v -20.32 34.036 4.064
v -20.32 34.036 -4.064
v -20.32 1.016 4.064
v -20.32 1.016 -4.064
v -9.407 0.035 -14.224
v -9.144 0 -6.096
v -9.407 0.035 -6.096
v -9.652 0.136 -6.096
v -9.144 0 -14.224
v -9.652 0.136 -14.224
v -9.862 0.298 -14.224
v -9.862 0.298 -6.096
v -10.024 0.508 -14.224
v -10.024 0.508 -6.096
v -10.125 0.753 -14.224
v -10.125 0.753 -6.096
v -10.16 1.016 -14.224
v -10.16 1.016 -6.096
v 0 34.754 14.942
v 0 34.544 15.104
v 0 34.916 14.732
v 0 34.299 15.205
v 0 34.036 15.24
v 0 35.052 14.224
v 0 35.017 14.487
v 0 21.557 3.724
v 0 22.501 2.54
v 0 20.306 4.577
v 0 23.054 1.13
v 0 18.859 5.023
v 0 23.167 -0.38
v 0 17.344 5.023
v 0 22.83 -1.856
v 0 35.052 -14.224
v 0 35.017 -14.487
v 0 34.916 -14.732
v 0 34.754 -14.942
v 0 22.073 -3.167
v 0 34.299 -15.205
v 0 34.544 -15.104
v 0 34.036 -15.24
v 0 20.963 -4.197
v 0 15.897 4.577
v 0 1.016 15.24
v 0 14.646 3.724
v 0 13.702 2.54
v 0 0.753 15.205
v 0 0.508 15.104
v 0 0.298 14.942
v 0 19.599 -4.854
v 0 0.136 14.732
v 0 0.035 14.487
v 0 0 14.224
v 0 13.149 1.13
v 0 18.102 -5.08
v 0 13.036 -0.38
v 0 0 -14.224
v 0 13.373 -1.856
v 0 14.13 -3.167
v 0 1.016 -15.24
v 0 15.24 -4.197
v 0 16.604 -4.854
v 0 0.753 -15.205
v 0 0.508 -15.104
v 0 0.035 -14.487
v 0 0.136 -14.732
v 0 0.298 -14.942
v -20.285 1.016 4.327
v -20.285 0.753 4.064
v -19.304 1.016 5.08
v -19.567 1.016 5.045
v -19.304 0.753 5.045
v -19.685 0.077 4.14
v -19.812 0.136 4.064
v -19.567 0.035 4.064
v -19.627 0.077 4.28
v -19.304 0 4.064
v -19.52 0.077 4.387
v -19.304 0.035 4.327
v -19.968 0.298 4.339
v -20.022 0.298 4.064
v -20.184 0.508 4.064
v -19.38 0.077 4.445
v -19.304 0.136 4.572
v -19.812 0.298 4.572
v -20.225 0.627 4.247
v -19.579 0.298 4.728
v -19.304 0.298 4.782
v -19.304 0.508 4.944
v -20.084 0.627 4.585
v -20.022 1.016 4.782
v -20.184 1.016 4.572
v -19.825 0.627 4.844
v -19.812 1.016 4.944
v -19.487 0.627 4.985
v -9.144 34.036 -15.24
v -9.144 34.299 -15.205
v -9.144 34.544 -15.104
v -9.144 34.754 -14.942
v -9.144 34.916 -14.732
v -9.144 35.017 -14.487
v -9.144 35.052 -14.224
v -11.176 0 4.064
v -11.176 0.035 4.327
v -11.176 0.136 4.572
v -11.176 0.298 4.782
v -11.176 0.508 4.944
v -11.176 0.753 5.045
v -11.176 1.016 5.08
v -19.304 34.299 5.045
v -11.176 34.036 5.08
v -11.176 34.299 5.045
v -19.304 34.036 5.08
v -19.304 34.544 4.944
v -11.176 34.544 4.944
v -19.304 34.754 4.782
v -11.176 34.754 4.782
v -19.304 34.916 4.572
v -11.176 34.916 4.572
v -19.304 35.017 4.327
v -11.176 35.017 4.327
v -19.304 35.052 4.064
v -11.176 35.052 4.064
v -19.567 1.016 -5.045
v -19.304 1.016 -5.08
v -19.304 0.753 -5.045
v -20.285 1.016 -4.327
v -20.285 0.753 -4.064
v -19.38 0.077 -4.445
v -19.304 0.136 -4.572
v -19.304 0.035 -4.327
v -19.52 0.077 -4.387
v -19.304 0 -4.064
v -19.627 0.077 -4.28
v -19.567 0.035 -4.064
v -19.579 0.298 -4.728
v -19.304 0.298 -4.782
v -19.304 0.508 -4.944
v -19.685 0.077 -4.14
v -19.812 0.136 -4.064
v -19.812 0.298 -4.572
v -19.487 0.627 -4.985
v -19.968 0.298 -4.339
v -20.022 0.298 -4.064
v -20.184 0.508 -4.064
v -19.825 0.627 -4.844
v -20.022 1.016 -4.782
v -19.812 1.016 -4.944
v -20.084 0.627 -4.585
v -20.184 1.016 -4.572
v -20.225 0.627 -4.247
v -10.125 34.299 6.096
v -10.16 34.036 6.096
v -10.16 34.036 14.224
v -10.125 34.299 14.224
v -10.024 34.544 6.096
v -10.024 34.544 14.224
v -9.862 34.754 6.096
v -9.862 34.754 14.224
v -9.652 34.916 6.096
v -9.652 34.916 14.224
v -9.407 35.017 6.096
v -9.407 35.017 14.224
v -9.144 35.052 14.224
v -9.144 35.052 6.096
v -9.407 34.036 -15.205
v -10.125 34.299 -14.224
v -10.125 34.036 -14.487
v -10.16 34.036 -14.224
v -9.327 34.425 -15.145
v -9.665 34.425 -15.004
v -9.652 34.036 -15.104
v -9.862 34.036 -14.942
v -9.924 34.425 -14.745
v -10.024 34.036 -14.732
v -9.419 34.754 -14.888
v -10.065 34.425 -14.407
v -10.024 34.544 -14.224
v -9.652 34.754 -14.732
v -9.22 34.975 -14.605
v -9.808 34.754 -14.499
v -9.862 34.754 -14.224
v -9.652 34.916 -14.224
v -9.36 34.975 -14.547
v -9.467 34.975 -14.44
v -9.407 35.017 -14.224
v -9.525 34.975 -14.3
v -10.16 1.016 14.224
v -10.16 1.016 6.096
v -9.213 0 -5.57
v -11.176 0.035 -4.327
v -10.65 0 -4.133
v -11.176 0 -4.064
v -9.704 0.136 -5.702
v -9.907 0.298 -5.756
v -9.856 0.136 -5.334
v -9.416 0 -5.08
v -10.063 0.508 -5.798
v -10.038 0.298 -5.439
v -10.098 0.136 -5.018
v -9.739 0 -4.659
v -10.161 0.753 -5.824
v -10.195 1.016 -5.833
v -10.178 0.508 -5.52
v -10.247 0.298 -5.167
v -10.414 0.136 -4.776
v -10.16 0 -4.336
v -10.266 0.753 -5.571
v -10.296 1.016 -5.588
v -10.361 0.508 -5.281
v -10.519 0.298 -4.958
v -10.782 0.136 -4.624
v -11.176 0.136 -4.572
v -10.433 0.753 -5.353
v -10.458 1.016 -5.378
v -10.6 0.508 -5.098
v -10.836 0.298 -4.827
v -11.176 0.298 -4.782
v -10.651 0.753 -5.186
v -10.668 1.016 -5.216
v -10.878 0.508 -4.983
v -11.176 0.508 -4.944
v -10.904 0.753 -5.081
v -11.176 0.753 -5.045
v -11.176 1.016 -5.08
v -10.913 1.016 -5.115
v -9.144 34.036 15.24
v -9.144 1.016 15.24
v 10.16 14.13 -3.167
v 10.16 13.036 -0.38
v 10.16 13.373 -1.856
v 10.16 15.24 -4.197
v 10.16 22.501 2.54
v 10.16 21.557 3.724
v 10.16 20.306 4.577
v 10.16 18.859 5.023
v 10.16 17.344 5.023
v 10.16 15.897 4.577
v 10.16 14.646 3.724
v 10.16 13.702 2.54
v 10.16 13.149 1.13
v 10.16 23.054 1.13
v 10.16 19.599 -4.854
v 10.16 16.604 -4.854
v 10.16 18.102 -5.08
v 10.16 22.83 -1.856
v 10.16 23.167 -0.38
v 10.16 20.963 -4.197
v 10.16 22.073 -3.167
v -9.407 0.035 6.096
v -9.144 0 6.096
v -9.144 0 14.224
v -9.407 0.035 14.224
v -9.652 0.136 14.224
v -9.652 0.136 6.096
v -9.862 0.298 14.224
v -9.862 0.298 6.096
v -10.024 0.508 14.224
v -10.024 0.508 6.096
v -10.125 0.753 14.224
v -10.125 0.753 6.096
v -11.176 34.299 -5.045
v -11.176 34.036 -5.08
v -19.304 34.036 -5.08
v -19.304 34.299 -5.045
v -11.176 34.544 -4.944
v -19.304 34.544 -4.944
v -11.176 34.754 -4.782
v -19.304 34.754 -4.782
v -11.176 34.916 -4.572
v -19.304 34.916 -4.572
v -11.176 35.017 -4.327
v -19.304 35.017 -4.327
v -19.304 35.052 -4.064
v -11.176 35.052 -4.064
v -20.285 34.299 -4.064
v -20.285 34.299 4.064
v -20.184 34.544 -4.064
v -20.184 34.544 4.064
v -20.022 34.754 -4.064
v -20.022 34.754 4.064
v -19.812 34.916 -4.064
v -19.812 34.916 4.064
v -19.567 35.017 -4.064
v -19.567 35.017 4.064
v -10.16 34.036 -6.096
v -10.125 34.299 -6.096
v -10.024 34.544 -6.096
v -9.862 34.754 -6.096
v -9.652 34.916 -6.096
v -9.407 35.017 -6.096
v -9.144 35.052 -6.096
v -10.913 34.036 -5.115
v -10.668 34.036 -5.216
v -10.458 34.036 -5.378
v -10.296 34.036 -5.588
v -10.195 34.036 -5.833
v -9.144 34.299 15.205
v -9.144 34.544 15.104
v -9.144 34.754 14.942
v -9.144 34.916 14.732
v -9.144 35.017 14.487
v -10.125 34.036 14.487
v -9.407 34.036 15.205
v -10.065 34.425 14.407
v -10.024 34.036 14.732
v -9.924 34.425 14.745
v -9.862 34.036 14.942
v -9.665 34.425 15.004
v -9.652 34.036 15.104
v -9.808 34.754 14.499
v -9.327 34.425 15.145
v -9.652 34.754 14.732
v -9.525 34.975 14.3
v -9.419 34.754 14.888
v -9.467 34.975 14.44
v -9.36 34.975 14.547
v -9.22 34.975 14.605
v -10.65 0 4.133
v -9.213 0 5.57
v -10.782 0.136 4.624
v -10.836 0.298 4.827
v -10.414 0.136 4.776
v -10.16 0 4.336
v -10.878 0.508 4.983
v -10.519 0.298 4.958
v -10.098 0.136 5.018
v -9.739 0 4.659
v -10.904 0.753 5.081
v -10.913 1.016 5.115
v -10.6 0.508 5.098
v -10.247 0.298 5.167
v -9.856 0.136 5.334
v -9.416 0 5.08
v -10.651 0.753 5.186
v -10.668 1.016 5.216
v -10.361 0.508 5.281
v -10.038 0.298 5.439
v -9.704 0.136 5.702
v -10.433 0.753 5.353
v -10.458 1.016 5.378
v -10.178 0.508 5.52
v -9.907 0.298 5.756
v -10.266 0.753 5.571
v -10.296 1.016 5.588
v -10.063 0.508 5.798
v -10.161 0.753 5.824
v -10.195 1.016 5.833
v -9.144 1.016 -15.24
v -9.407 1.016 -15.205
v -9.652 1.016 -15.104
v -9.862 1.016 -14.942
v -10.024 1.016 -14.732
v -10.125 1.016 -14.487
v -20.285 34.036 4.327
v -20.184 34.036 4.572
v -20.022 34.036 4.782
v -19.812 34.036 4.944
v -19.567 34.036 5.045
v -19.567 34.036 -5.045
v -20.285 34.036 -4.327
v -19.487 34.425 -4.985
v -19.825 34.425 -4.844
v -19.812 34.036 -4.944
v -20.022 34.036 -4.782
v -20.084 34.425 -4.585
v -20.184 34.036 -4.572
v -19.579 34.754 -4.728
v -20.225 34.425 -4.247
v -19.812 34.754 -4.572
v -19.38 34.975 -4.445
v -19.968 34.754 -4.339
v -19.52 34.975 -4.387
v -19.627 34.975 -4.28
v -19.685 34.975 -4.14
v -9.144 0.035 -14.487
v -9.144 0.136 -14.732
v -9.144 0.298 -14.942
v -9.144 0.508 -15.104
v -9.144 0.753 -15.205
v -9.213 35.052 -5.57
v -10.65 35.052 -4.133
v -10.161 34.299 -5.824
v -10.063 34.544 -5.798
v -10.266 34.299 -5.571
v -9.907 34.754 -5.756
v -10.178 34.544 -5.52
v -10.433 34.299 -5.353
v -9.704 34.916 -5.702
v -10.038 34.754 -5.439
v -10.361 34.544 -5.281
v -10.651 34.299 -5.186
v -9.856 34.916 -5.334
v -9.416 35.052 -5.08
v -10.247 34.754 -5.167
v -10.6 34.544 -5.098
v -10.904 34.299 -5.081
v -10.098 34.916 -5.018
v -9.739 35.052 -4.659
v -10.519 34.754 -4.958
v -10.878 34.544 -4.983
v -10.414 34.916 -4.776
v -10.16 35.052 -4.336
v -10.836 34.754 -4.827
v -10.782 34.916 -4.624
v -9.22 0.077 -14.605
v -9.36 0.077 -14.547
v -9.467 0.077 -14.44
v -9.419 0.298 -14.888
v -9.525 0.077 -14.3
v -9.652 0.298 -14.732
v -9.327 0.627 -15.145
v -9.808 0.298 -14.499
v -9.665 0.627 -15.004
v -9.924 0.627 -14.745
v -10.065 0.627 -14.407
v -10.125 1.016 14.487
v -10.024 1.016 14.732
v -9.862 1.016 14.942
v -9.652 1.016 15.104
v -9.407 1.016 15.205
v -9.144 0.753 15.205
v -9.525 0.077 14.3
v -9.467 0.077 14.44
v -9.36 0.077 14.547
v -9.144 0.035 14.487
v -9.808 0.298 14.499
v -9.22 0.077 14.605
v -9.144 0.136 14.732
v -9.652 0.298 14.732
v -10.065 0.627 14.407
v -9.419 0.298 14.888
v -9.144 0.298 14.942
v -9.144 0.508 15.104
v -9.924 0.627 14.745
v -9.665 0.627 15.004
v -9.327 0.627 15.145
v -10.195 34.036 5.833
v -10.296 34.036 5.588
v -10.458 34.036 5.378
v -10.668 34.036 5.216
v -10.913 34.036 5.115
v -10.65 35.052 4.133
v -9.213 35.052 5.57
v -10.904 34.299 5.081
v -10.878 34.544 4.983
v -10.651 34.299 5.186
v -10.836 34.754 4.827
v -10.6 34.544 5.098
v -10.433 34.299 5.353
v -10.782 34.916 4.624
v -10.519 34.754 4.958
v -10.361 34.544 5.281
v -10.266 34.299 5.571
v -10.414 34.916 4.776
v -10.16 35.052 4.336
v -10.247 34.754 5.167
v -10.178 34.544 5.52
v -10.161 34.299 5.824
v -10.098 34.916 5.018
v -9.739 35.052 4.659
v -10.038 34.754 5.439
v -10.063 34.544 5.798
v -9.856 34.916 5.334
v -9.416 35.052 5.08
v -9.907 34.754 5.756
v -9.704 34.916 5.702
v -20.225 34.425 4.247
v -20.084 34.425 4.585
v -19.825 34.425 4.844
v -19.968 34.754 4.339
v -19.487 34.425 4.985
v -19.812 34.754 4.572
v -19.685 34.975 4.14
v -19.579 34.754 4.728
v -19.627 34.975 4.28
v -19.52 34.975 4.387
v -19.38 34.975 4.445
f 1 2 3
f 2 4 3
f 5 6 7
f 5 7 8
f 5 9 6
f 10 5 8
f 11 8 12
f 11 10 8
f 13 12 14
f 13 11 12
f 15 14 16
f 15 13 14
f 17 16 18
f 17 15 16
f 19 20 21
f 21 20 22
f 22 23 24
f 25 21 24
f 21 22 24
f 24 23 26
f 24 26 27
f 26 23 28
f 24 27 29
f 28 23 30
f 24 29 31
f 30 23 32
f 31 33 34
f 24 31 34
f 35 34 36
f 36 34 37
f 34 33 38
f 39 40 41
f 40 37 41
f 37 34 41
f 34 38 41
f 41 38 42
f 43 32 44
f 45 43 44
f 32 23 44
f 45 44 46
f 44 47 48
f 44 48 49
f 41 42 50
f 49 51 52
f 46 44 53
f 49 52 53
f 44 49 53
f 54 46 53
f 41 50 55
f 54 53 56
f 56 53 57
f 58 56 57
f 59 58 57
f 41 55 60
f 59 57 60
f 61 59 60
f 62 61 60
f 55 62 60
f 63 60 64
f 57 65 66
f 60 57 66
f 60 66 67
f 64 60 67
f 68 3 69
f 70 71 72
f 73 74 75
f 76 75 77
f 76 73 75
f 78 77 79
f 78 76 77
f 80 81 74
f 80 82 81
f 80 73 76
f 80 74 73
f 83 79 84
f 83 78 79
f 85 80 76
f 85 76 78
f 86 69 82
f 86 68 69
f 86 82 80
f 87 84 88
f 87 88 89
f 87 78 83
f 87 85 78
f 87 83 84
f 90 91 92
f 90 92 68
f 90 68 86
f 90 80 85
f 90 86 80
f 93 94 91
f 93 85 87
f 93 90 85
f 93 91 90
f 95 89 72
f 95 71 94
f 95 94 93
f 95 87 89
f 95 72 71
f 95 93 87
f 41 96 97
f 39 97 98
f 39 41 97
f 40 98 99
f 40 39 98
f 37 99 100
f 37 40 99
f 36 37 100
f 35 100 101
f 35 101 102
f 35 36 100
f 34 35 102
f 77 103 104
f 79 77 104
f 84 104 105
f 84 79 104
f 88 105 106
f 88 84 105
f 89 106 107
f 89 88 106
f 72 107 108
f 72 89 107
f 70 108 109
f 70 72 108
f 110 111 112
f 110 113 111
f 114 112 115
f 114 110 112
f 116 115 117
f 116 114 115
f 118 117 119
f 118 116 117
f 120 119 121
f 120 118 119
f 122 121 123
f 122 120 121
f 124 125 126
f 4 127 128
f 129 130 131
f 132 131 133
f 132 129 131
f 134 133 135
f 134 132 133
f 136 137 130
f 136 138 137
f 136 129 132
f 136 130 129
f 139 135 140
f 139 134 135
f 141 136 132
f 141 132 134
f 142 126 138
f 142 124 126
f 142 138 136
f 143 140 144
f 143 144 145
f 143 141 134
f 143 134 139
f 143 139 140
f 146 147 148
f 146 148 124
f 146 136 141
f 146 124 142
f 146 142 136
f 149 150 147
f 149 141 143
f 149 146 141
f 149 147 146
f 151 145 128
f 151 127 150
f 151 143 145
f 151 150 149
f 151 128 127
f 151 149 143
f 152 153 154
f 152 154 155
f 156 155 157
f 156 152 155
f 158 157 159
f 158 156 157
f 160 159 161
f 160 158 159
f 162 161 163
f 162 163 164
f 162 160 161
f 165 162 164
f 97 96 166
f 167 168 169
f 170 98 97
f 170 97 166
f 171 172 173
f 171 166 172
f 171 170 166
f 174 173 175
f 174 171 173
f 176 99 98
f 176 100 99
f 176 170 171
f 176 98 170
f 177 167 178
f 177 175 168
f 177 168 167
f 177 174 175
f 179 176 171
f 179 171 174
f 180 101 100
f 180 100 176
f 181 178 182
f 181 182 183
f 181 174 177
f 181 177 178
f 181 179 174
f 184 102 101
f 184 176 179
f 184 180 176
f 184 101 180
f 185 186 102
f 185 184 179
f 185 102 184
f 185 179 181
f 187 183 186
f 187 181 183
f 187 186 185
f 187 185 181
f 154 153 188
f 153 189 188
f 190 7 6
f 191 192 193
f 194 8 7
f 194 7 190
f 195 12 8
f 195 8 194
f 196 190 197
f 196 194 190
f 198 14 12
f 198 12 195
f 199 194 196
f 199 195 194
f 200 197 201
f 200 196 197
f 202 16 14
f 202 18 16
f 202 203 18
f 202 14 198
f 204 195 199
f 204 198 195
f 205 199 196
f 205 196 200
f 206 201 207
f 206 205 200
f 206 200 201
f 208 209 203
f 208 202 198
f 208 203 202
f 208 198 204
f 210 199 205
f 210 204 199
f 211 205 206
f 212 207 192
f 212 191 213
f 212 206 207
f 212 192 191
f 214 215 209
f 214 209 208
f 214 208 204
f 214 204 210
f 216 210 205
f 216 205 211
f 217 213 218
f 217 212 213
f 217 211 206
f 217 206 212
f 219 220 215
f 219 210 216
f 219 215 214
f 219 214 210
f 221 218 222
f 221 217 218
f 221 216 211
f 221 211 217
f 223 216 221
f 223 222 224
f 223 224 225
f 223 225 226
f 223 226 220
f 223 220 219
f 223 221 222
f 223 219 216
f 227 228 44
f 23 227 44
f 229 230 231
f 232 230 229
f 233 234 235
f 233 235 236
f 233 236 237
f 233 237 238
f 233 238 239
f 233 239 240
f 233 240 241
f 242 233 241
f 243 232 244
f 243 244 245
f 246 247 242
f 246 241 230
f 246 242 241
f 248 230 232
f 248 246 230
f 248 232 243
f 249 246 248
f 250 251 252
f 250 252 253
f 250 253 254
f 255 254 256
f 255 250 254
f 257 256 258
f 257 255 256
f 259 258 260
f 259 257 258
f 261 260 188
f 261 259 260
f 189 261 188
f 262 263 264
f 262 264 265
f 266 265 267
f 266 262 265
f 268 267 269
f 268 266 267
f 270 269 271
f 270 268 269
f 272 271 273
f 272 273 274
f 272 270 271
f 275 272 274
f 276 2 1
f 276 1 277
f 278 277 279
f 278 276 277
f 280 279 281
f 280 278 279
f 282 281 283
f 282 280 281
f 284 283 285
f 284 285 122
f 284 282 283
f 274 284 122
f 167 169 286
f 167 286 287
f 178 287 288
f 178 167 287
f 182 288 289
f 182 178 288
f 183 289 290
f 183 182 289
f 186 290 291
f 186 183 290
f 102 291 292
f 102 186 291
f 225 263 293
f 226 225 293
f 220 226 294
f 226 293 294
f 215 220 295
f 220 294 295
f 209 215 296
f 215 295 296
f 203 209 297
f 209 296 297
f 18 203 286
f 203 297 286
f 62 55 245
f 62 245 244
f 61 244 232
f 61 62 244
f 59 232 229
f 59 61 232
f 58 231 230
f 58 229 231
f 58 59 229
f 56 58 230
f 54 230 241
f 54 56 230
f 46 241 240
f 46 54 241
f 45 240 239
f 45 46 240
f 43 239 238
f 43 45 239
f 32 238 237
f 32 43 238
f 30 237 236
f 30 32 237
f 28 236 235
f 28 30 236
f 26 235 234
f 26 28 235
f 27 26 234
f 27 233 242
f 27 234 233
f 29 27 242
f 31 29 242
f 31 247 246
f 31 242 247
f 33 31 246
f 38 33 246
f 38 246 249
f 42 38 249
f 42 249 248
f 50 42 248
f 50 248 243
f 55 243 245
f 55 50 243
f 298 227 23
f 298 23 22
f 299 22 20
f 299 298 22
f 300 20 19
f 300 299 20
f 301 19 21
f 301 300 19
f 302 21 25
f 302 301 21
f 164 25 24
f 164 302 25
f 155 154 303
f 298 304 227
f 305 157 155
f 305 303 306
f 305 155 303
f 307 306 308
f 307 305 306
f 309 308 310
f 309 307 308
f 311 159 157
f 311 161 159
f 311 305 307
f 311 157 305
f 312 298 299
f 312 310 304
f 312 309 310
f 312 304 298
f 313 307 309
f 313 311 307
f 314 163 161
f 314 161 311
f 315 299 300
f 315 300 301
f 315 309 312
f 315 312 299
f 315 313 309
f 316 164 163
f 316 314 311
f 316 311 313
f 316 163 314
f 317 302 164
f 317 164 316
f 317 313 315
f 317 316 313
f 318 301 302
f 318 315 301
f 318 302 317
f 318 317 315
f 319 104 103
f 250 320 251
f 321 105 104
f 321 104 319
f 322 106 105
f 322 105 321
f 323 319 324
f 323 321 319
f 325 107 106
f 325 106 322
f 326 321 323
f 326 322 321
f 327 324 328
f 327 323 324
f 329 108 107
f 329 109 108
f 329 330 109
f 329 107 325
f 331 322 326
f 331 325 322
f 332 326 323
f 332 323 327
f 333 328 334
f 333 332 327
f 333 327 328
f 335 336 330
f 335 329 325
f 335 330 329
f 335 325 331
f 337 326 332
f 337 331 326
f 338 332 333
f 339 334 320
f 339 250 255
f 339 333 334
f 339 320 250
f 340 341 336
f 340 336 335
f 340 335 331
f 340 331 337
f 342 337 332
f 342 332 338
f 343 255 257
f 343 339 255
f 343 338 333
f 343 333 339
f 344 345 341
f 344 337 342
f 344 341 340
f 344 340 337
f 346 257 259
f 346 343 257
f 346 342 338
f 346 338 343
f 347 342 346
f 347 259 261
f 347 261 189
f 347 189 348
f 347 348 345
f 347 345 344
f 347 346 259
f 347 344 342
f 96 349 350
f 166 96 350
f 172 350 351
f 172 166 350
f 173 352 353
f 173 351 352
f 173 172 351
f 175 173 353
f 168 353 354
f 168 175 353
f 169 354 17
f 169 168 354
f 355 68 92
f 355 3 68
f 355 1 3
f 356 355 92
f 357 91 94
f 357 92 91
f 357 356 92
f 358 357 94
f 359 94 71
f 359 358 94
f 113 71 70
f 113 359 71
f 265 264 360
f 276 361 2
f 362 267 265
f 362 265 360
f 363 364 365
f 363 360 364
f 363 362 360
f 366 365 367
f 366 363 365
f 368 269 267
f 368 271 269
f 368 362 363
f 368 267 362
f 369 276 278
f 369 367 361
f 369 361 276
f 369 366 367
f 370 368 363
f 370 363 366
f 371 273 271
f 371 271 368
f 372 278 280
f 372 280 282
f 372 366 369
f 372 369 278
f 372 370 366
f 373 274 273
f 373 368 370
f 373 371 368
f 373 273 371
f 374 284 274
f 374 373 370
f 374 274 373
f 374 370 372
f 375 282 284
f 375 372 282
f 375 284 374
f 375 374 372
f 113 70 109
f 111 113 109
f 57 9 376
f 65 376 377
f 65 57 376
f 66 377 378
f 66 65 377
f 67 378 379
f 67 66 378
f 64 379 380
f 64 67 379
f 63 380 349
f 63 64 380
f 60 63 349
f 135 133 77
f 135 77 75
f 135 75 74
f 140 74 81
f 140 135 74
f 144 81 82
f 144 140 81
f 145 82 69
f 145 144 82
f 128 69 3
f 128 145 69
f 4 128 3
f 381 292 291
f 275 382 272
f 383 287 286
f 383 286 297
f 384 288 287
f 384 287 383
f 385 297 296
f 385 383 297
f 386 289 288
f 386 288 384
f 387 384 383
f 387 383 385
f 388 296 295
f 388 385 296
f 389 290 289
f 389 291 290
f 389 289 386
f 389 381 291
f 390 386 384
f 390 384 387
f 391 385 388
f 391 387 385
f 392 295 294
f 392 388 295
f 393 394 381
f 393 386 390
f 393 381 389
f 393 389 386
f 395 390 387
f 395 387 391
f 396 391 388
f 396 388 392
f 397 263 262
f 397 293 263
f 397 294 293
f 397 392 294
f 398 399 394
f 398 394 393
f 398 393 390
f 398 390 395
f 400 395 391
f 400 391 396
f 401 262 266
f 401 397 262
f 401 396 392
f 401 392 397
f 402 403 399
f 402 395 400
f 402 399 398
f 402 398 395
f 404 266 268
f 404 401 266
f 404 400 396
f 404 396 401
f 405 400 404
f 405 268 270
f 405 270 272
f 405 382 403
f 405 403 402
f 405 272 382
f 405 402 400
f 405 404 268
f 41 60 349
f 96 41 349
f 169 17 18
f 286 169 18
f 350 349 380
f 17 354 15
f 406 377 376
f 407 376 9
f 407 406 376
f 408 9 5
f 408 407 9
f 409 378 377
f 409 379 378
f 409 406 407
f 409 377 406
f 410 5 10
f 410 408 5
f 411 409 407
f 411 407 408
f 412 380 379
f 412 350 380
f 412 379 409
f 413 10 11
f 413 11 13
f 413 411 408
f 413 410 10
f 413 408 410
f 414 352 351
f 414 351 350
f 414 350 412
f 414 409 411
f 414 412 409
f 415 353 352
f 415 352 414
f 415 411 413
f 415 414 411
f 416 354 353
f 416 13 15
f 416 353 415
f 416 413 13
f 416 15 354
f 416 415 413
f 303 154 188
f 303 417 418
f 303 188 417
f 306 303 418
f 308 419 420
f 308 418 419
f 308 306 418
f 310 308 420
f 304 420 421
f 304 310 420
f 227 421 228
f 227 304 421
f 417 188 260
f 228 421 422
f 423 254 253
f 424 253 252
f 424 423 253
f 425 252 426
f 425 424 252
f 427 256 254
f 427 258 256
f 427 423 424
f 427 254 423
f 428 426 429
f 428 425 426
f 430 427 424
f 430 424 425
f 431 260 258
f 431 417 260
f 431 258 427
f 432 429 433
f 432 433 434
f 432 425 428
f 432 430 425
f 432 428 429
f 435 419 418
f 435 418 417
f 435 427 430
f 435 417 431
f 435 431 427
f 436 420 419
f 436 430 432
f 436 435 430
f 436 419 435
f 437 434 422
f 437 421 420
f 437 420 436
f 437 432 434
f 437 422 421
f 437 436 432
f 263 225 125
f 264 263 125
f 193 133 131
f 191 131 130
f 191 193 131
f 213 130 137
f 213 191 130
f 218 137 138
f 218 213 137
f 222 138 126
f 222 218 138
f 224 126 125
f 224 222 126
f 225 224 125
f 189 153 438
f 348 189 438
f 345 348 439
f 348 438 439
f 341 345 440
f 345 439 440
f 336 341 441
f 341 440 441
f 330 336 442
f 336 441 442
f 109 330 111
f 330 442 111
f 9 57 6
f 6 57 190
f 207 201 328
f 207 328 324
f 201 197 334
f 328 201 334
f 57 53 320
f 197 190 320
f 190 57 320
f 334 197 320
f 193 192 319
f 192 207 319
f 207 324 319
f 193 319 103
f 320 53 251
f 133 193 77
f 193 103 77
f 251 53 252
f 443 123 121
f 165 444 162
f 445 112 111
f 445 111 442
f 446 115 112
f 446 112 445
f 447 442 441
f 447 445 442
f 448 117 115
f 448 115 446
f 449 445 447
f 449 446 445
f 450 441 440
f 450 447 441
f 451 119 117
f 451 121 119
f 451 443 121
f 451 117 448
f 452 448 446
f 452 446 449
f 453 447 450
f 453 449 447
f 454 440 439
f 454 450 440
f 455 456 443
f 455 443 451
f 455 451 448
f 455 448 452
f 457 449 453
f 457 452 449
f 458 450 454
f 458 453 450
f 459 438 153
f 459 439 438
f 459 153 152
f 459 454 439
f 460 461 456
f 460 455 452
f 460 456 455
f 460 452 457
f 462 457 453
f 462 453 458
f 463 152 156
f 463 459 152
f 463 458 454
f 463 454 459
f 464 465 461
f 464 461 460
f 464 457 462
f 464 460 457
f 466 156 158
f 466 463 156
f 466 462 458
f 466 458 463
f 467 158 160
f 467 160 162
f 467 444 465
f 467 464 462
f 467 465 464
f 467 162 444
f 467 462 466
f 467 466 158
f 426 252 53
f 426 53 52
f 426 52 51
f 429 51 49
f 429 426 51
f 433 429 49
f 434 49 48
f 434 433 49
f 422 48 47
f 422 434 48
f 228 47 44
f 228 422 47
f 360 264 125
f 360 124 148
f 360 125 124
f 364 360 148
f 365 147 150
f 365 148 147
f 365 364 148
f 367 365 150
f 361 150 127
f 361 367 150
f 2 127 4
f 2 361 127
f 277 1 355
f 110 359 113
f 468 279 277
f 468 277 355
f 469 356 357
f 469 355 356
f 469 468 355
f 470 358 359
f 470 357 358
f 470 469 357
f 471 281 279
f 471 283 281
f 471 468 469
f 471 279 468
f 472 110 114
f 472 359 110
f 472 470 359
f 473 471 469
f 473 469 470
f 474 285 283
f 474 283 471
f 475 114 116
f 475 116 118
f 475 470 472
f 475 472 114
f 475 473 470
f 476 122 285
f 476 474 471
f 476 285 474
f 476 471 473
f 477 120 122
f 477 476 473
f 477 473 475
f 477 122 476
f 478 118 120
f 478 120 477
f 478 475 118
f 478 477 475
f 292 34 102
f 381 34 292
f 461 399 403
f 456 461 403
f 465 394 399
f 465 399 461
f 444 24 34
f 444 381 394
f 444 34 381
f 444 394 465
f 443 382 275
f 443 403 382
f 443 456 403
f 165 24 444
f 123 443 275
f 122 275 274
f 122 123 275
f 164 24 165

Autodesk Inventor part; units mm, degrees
ref_plane "YZ Plane" through (0, 0, 0) normal (1, 0, 0) x (0, 1, 0)
ref_plane "XZ Plane" through (0, 0, 0) normal (0, 1, 0) x (-1, 0, 0)
ref_plane "XY Plane" through (0, 0, 0) normal (0, 0, 1) x (1, 0, 0)
sketch "Sketch1" plane through (0, 0, 0) normal (0, 1, 0) x (-1, 0, 0)
  line L0 (0, 15.24) -> (0, -15.24)
  line L1 (0, -15.24) -> (10.16, -15.24)
  line L2 (10.16, -15.24) -> (10.16, -5.08)
  line L3 (10.16, -5.08) -> (20.32, -5.08)
  line L4 (20.32, -5.08) -> (20.32, 5.08)
  line L5 (20.32, 5.08) -> (10.16, 5.08)
  line L6 (10.16, 5.08) -> (10.16, 15.24)
  line L7 (10.16, 15.24) -> (0, 15.24)
  point P0 (0, 0)
  dimension "d1" = 10.16
  dimension "d2" = 10.16
  dimension "d3" = 10.16
  dimension "d4" = 15.24
  dimension "d5" = 10.16
extrude "Extrusion1" add sketch "Sketch1" along normal blind 35.052
sketch "Sketch2" plane through (0, 0, 15.24) normal (1, 0, 0) x (0, 0, -1)
  circle A0 centre (15.24, 18.1015) radius 5.08
  point P0 (15.24, 0)
  dimension "d8" = 10.16
extrude "Extrusion2" add sketch "Sketch2" along normal blind 10.16
fillet "Fillet1" radius 1.016 6 edges at (-10.16, 17.526, 5.08) (-10.16, 17.526, -5.08) (-20.32, 17.526, 5.08) (-20.32, 17.526, -5.08) (-10.16, 17.526, 15.24) (-10.16, 17.526, -15.24)
fillet "Fillet2" radius 1.016 26 edges at (-9.8624, 35.052, 14.9424) (-4.572, 35.052, 15.24) (-10.4576, 35.052, 5.3776) (-15.24, 35.052, 5.08) (-20.0224, 35.052, 4.7824) (-20.32, 35.052, 0) (-20.0224, 35.052, -4.7824) (-15.24, 35.052, -5.08) (-10.4576, 35.052, -5.3776) (-10.16, 35.052, -10.16) (-9.8624, 35.052, -14.9424) (-4.572, 35.052, -15.24) (-10.16, 35.052, 10.16) (-9.8624, 0, 14.9424) (-10.16, 0, 10.16) (-10.4576, 0, 5.3776) (-15.24, 0, 5.08) (-20.0224, 0, 4.7824) (-20.32, 0, 0) (-20.0224, 0, -4.7824) (-15.24, 0, -5.08) (-10.4576, 0, -5.3776) (-10.16, 0, -10.16) (-9.8624, 0, -14.9424) (-4.572, 0, -15.24) (-4.572, 0, 15.24)
properties part number "Slider2"
